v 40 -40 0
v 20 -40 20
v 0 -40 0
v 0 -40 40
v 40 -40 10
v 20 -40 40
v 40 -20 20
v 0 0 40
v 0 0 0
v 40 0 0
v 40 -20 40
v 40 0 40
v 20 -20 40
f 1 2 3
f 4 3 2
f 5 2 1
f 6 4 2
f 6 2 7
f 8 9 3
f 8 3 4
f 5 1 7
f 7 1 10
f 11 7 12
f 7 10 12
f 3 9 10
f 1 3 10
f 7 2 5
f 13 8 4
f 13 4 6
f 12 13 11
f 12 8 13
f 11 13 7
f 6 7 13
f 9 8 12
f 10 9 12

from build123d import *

# Parameters (mm, degrees)
F0_W      = 40
F0_H      = 40
F1_DEPTH  = 40
F2_W      = 20
F2_H      = 20
F3_DEPTH  = 20
F7_DEPTH  = 24.4958974278
F9_DEPTH  = 20
F11_DEPTH = 20


with BuildPart() as f1:
    # F0 (on Front) → F1 (new body)
    with BuildSketch(Plane.XZ):
        with Locations((20, 20)):
            Rectangle(F0_W, F0_H)
    extrude(amount=F1_DEPTH)

    # F2 (on face) → F3 (cut)
    with BuildSketch(Plane.XZ.offset(40)):
        with Locations((30, 30)):
            Rectangle(F2_W, F2_H)
    extrude(amount=-F3_DEPTH, mode=Mode.SUBTRACT)

    # F6 (on 3pt) → F7 (cut, through all)
    with BuildSketch(Plane(origin=(16.6666666667, -16.6666666667, 33.3333333333), x_dir=(0.9128709292, 0.1825741858, -0.3651483717), z_dir=(-0.4082482905, 0.4082482905, -0.8164965809))):
        Polygon((3.6514837167, 26.83281573), (25.5603860169, 8.94427191), (25.5603860169, 31.304951685), align=None)
    extrude(amount=-F7_DEPTH, mode=Mode.SUBTRACT)

    # F8 (on face) → F9 (join, through all)
    with BuildSketch(Plane.XZ.offset(20)):
        Polygon((40, 20), (20, 40), (20, 20), align=None)
    extrude(amount=F9_DEPTH)

    # F10 (on face) → F11 (cut, through all)
    with BuildSketch(Plane(origin=(0, 0, 20), x_dir=(1, 0, 0), z_dir=(0, 0, -1))):
        Polygon((20, 40), (40, 20), (40, 40), align=None)
    extrude(amount=-F11_DEPTH, mode=Mode.SUBTRACT)


solid = f1.part
